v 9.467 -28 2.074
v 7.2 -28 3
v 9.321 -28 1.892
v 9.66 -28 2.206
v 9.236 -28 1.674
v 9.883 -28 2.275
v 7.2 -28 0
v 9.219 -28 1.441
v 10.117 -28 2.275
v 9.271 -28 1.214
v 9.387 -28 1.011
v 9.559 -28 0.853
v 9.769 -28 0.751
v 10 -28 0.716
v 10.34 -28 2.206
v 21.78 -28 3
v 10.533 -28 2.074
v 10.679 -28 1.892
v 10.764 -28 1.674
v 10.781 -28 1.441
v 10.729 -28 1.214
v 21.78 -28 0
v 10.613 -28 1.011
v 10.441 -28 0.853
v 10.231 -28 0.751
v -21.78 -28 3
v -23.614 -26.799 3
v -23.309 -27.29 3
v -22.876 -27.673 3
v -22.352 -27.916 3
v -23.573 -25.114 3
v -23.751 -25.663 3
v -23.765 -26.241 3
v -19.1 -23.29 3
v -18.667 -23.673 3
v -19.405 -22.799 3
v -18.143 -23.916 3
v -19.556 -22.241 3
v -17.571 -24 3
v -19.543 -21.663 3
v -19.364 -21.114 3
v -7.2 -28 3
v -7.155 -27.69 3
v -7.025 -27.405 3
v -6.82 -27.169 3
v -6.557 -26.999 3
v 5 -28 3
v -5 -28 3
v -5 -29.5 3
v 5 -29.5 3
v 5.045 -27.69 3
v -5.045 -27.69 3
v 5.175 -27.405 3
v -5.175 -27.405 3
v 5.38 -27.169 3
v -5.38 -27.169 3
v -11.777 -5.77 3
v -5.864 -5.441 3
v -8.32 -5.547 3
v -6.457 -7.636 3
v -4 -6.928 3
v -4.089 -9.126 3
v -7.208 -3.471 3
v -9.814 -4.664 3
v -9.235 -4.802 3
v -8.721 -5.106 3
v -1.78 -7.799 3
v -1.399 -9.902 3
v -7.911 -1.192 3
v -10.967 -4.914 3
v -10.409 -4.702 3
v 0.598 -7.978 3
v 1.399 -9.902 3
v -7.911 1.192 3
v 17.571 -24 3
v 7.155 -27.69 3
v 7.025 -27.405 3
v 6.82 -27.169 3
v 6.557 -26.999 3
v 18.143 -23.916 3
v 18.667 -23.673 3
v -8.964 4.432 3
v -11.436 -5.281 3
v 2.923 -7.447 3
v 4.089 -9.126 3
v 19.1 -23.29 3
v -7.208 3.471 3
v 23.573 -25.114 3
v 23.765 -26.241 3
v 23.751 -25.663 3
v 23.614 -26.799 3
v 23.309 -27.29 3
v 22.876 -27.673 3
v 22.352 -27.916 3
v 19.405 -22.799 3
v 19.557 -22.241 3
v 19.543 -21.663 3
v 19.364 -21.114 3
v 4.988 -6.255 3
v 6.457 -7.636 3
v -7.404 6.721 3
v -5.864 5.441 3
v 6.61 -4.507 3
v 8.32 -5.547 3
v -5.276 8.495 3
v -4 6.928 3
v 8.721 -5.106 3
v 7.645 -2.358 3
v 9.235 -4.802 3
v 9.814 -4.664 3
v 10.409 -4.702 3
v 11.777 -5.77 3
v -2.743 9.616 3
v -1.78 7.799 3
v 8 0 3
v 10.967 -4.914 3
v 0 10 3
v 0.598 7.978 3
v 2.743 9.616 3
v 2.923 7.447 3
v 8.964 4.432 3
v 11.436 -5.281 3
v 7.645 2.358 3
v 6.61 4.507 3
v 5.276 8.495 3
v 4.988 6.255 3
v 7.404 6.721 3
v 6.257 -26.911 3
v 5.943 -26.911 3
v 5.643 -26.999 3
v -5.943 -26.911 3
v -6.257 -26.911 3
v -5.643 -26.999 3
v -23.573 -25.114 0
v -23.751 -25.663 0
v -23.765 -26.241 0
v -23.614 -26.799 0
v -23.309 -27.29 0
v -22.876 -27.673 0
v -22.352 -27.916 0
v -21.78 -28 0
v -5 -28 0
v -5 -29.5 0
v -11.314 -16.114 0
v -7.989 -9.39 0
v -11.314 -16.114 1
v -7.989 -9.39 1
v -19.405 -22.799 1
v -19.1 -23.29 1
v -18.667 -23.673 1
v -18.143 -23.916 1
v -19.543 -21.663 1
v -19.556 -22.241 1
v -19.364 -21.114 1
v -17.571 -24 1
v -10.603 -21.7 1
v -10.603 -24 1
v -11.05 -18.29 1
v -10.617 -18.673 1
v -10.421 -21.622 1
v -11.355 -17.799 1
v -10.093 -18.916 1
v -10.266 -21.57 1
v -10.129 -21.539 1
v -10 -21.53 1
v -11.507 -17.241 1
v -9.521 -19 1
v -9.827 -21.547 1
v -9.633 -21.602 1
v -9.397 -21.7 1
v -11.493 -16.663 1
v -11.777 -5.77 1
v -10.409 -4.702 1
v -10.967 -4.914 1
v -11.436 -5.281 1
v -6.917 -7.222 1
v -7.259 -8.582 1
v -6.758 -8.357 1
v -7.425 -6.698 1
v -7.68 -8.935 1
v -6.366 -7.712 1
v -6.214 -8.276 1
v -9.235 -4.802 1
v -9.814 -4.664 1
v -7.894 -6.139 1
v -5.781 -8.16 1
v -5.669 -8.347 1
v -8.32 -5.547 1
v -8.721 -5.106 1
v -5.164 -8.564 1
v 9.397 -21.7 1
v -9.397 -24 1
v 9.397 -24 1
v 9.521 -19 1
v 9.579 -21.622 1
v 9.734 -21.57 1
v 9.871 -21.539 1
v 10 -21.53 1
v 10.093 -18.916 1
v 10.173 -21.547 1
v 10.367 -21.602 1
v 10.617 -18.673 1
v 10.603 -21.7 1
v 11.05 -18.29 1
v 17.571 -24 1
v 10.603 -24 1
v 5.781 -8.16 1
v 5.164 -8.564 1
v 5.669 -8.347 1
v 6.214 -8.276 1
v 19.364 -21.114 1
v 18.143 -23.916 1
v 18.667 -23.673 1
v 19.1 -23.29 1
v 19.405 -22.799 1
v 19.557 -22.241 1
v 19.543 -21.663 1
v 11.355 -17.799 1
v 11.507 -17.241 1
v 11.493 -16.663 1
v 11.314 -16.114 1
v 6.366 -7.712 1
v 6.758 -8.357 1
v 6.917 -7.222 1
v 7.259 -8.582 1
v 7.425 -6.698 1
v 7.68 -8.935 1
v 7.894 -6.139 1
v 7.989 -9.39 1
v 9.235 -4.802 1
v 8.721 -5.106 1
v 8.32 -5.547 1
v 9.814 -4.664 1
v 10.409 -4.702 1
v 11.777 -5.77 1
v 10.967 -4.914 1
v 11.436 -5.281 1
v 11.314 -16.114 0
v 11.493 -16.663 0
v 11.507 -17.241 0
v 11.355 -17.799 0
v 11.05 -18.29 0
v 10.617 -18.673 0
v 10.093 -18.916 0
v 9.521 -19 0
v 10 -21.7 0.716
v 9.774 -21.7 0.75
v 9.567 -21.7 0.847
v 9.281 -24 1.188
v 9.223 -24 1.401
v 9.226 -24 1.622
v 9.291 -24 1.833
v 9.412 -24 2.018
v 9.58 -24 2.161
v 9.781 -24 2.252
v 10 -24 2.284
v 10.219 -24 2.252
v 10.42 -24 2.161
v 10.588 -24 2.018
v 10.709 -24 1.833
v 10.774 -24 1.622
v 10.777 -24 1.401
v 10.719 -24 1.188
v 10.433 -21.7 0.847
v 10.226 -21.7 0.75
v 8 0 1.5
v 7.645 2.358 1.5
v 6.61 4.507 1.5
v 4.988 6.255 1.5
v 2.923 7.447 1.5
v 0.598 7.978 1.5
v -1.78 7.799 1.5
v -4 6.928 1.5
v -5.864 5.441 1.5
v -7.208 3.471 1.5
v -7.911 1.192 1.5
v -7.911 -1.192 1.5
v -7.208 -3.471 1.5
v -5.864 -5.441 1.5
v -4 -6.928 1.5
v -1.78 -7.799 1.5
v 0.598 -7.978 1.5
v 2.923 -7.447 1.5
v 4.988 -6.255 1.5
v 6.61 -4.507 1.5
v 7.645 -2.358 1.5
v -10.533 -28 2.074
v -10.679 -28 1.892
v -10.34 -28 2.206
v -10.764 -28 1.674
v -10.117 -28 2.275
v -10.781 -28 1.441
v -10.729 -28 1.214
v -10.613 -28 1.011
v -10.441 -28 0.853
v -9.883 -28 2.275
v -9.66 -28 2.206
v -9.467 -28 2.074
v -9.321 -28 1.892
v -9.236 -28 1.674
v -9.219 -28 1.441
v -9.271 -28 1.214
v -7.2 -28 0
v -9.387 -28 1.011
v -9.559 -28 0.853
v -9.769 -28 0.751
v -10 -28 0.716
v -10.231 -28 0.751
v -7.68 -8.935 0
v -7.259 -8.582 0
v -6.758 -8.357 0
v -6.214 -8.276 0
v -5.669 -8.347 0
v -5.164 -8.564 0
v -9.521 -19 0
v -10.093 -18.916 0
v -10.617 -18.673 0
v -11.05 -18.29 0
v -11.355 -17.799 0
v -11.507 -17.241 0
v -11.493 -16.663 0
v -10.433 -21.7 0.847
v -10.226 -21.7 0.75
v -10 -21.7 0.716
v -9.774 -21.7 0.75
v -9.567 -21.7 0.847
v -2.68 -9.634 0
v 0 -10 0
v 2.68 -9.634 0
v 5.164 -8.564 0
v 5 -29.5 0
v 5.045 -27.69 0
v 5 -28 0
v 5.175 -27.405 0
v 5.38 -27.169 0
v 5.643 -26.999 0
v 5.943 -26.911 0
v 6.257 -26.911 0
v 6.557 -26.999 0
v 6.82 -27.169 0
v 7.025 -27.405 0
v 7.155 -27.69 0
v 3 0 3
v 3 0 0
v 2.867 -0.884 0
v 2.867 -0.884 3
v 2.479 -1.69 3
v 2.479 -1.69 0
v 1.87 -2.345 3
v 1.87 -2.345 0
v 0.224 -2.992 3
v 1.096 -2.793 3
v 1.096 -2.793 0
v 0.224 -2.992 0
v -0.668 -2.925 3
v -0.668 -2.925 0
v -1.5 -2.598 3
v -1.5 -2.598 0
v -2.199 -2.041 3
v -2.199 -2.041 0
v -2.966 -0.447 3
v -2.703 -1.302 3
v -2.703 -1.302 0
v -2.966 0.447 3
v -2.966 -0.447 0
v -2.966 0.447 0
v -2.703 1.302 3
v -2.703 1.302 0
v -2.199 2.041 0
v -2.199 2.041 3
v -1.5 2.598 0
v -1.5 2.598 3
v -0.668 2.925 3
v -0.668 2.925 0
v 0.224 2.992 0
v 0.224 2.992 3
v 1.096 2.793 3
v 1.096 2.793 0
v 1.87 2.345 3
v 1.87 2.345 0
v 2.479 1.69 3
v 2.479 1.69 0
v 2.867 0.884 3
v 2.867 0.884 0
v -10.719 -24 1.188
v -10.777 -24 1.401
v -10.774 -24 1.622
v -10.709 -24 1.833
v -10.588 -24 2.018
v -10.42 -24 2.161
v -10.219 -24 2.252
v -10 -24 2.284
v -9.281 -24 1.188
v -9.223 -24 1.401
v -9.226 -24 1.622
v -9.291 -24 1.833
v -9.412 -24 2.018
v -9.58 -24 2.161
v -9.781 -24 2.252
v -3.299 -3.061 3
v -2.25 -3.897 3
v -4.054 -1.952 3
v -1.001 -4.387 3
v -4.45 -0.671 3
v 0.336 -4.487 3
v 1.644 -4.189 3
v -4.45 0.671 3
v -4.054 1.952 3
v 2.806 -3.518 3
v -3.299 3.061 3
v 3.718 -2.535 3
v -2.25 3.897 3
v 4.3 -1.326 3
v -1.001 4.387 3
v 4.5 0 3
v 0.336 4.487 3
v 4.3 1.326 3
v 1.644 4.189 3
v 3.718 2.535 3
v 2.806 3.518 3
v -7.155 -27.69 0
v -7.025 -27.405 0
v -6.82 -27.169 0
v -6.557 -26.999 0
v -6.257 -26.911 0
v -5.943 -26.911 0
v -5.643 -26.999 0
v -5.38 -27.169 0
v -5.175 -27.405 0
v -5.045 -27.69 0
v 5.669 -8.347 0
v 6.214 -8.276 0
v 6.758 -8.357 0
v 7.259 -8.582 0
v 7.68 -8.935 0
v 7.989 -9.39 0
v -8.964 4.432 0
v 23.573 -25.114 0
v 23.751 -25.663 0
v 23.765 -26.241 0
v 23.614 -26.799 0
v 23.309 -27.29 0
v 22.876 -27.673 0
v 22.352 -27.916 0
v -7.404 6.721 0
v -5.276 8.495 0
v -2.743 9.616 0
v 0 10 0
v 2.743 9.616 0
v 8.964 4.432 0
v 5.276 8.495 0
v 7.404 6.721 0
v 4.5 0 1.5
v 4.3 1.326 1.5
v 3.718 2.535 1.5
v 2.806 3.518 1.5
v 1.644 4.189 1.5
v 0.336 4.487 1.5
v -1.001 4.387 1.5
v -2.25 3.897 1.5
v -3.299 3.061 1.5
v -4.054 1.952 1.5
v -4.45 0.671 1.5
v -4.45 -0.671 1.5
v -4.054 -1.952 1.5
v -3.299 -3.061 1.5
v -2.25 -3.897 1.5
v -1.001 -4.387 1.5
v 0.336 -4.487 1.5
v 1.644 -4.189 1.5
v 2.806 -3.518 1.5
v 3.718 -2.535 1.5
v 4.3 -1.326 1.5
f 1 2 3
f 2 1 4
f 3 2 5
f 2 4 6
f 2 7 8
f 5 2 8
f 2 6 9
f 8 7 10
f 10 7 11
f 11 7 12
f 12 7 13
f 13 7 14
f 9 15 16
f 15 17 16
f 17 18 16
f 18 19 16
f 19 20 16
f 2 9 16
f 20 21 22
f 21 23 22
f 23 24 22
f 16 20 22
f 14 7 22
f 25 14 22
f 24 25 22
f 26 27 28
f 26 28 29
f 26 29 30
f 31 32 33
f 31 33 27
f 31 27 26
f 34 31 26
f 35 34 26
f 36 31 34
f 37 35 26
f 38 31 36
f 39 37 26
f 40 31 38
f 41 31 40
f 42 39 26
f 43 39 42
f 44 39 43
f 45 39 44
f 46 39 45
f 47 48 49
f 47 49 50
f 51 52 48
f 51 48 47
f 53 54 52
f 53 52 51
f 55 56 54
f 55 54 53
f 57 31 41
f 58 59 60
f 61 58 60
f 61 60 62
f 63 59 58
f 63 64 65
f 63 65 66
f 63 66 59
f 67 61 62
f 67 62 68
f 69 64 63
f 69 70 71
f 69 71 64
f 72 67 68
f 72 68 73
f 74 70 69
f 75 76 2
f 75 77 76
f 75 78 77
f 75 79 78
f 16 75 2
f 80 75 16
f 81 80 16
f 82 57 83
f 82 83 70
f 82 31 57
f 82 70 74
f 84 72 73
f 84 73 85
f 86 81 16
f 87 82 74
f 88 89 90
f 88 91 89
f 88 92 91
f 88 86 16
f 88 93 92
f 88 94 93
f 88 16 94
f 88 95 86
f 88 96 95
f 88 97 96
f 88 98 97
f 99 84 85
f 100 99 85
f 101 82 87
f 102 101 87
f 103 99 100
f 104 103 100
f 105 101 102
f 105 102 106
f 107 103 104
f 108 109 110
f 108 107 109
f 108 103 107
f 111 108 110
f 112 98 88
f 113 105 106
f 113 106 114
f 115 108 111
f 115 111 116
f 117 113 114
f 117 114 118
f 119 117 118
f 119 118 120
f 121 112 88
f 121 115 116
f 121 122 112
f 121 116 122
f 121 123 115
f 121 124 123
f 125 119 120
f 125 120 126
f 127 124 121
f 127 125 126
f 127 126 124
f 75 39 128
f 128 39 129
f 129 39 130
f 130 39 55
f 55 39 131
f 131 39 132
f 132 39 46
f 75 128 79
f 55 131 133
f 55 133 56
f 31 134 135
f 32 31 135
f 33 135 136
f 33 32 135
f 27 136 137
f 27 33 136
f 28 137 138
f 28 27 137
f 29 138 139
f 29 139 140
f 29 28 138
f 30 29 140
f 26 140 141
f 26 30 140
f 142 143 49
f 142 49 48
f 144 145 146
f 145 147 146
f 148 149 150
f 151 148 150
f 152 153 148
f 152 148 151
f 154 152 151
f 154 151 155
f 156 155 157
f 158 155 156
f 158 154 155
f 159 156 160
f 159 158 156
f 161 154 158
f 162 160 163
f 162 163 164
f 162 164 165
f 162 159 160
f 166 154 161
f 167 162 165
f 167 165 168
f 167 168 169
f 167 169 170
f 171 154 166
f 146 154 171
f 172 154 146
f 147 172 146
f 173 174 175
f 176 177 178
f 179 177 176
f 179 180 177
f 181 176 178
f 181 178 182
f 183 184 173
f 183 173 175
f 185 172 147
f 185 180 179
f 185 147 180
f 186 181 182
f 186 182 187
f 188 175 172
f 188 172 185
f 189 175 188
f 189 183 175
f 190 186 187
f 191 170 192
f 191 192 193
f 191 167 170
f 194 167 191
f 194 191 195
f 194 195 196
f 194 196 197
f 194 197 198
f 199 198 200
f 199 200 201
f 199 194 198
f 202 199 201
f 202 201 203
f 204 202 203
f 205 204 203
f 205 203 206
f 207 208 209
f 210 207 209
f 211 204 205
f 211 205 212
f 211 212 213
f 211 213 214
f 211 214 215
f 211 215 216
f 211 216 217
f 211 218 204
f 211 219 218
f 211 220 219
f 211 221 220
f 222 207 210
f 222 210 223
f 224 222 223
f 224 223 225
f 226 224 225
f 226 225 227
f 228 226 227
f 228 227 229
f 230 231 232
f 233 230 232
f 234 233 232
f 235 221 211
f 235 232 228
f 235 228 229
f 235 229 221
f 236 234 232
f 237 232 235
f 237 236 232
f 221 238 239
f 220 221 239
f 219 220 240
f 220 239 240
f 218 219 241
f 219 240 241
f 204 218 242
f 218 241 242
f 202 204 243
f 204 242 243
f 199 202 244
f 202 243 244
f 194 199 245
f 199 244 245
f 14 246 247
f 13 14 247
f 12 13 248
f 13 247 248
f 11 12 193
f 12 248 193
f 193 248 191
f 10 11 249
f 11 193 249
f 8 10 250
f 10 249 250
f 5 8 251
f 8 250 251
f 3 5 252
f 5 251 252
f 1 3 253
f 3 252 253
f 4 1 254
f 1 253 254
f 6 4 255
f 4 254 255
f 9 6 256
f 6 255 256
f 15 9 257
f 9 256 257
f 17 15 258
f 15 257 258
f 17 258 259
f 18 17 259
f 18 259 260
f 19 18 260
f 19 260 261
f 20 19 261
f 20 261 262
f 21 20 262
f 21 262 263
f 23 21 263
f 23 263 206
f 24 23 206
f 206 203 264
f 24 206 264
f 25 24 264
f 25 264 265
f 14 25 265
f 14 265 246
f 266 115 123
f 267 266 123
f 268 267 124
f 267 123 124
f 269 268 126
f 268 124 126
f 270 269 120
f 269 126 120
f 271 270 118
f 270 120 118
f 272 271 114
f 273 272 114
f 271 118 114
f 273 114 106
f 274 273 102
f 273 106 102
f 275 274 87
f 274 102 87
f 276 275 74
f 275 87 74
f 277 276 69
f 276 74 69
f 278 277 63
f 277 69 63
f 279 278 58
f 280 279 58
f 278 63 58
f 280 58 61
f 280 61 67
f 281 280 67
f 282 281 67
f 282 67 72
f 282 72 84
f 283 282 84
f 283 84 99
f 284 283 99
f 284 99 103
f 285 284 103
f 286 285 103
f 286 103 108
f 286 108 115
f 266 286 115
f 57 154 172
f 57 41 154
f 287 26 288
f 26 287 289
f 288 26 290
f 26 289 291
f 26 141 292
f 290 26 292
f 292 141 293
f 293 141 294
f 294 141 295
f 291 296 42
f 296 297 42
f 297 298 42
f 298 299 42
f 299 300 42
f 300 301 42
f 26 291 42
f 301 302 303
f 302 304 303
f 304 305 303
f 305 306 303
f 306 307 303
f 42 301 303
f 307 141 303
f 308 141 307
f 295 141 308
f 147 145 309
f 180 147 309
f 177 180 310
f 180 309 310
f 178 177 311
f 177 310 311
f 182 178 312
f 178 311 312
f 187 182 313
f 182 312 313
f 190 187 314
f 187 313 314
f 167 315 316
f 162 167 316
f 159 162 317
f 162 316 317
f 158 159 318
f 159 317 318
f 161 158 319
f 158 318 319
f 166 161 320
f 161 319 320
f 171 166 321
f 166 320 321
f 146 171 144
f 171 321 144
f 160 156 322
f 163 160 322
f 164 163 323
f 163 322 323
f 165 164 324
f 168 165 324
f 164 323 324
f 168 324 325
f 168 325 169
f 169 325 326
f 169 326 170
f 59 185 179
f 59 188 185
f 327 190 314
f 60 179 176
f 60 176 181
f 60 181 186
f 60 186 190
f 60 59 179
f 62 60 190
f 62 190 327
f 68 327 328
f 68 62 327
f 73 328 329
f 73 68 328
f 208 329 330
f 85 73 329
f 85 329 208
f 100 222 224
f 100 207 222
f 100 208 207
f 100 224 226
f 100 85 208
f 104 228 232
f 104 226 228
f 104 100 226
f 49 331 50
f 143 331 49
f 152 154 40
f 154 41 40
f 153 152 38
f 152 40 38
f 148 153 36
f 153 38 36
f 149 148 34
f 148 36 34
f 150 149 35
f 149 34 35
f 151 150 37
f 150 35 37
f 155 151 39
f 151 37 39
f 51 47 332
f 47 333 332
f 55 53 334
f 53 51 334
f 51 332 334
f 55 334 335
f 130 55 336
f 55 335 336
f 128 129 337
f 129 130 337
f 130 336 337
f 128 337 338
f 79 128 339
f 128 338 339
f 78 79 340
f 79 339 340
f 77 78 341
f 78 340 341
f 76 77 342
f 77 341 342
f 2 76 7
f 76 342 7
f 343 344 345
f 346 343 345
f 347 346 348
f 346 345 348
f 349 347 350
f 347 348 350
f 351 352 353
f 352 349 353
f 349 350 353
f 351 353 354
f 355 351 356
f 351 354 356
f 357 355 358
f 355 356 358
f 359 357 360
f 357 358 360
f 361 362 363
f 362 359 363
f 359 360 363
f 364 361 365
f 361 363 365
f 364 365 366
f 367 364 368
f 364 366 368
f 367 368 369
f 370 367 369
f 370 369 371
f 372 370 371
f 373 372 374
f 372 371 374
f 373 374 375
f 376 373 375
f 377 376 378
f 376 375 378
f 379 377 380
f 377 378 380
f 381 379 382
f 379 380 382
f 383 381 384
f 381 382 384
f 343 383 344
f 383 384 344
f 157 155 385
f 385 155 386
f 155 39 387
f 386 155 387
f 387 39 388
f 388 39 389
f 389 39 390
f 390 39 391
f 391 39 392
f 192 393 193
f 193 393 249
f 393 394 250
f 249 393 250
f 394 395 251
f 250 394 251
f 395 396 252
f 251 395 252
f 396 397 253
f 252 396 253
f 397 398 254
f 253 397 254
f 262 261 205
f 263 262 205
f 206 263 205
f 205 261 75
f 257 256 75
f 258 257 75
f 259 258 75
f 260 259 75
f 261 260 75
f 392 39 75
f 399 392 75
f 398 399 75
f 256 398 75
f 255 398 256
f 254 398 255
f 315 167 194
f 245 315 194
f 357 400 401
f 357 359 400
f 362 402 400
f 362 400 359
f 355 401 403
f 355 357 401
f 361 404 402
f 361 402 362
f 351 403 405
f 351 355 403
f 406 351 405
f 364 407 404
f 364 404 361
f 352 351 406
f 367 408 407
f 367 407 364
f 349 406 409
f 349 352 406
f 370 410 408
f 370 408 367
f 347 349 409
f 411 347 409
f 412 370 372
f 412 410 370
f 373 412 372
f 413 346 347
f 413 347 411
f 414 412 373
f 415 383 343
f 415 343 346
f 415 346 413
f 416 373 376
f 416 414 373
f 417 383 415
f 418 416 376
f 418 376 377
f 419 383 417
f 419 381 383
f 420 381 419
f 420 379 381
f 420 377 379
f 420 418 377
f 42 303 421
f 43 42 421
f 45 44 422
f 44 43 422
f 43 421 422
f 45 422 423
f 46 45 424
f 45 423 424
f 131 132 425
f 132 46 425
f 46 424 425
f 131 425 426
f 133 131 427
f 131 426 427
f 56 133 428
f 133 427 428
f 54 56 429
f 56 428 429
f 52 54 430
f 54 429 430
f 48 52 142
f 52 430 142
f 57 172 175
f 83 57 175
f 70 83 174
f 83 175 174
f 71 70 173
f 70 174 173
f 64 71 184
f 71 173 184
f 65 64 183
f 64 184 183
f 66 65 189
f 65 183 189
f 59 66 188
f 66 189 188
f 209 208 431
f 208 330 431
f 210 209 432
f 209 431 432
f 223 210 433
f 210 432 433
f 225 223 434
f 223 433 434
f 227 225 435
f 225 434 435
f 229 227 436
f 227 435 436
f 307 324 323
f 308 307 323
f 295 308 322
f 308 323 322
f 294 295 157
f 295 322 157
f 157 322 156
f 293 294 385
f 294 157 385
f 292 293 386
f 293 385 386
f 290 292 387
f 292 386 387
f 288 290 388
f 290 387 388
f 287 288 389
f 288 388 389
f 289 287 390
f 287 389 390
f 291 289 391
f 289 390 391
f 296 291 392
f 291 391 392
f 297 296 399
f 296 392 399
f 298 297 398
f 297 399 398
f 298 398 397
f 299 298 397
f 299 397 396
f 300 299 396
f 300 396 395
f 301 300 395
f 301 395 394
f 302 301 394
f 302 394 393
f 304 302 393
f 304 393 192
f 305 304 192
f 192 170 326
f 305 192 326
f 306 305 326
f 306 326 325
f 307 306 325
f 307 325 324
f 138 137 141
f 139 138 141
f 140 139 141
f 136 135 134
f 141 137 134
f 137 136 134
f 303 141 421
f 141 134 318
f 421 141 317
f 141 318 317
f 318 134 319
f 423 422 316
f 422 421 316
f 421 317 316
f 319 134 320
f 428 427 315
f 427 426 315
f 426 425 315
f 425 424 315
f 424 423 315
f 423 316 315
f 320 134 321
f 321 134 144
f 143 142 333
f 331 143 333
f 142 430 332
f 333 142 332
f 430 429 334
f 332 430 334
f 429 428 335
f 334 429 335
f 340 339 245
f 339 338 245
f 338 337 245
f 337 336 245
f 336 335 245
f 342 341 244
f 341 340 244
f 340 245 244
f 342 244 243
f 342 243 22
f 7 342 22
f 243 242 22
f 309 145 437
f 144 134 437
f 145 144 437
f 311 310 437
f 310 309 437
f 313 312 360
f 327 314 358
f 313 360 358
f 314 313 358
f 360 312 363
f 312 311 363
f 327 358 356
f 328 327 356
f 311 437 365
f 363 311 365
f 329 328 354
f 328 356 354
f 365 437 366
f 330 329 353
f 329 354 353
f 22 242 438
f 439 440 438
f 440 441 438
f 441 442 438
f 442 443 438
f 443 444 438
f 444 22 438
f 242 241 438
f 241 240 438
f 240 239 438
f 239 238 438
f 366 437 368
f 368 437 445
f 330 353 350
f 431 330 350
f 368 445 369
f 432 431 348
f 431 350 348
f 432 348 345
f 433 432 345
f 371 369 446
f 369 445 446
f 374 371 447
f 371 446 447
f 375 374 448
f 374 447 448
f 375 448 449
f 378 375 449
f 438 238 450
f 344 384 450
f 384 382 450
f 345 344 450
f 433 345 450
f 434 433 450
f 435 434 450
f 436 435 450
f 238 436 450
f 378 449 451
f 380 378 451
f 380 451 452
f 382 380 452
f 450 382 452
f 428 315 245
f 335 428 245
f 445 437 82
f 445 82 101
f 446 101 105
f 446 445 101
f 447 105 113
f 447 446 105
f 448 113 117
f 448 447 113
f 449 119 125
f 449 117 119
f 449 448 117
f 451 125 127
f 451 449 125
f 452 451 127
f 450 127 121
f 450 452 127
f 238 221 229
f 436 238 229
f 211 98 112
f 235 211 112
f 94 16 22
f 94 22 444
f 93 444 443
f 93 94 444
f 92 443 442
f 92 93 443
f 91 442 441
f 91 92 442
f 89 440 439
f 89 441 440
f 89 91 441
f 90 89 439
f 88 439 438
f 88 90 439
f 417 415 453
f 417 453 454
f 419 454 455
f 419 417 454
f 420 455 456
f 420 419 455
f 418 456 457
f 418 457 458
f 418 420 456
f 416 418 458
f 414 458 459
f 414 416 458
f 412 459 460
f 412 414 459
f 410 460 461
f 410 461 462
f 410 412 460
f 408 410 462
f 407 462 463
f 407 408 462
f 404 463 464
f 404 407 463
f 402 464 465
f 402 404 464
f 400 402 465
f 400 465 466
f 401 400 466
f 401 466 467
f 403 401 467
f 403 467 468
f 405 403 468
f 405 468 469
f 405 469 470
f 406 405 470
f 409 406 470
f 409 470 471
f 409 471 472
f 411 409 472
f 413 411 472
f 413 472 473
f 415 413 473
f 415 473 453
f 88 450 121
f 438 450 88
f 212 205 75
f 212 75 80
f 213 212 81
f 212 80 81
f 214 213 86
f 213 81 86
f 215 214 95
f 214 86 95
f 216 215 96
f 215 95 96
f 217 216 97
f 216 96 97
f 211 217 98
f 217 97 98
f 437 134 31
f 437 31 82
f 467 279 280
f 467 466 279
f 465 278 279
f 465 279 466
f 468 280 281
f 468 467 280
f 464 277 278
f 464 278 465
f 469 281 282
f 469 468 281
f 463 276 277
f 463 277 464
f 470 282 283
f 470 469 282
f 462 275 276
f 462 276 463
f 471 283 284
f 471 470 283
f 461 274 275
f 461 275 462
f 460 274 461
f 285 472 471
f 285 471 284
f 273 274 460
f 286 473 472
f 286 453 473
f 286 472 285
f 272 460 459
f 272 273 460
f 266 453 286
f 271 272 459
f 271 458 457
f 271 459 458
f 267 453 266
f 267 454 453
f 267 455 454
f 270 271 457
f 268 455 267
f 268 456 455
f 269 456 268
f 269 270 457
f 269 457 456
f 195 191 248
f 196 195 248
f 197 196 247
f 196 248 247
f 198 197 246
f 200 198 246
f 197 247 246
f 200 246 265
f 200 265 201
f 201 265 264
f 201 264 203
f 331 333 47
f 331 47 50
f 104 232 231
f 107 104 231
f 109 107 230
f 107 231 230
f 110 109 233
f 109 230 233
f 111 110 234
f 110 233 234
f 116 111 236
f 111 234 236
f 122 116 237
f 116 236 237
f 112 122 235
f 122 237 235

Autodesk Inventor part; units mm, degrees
ref_plane "YZ Plane" through (0, 0, 0) normal (1, 0, 0) x (0, 1, 0)
ref_plane "XZ Plane" through (0, 0, 0) normal (0, 1, 0) x (-1, 0, 0)
ref_plane "XY Plane" through (0, 0, 0) normal (0, 0, 1) x (1, 0, 0)
sketch "スケッチ1" plane through (0, 0, 0) normal (0, 0, 1) x (1, 0, 0)
  circle A0 centre (0, 0) radius 3
  circle A1 centre (0, 0) radius 10
  line L0 (-25, -28) -> (25, -28)
  line L1 (-5, -28) -> (5, -28)
  line L2 (5, -28) -> (5, -29.5)
  line L3 (5, -29.5) -> (-5, -29.5)
  line L4 (-5, -29.5) -> (-5, -28)
  circle A2 centre (-6.1, -28) radius 1.1
  circle A3 centre (6.1, -28) radius 1.1
  line L5 (-25, -28) -> (-8.9641, 4.4322)
  line L6 (8.9641, 4.4322) -> (25, -28)
  line L7 (0, 0) -> (0, -28) construction
  point P0 (0, -29.5)
  point P1 (-7.2, -28)
  point P2 (7.2, -28)
  dimension "d5" = 2.2
  dimension "d6" = 2.2
  dimension "d0" = 6
  dimension "d1" = 20
  dimension "d2" = 28
  dimension "d3" = 1.5
  dimension "d4" = 10
  dimension "d7" = 50
extrude "押し出し1" add sketch "スケッチ1" along normal blind 3 contours A1 | A1 L6 L0 A3 A2 L5 | L2 L3 L4 L0
fillet "フィレット1" radius 2 2 edges at (25, -28, 1.5) (-25, -28, 1.5)
sketch "スケッチ2" plane through (-7.2, -28, 0) normal (0, -1, 0) x (1, 0, 0)
  line L0 (2.2, 0) -> (2.2, 3) projected
  line L1 (12.2, 0) -> (12.2, 3) projected
  point P0 (7.2, 0)
  point P1 (-2.8, 1.5)
  point P2 (17.2, 1.5)
  point P3 (2.2, 1.5)
  point P4 (12.2, 1.5)
  dimension "d11" = 5
  dimension "d12" = 5
hole "穴1" at (-10, -28, 1.5) at (10, -28, 1.5) direction (0, 1, 0) diameter 1.567 depth 6.3 tip angle 118 thread size "M2x0.4" class "6H" standard "ISO Metric profile"
sketch "スケッチ3" plane through (0, 0, 3) normal (0, 0, 1) x (1, 0, 0)
  arc A0 (-23.5728, -25.1136) -> (-21.78, -28) centre (-21.78, -26) ccw projected
  line L0 (-21.78, -28) -> (-7.2, -28) projected
  arc A1 (-5, -28) -> (-7.2, -28) centre (-6.1, -28) ccw projected
  line L1 (-5, -28) -> (-5, -29.5) projected
  line L2 (-5, -29.5) -> (5, -29.5) projected
  line L3 (5, -29.5) -> (5, -28) projected
  arc A2 (7.2, -28) -> (5, -28) centre (6.1, -28) ccw projected
  line L4 (7.2, -28) -> (21.78, -28) projected
  arc A3 (21.78, -28) -> (23.5728, -25.1136) centre (21.78, -26) ccw projected
  line L5 (23.5728, -25.1136) -> (8.9641, 4.4322) projected
  arc A4 (8.9641, 4.4322) -> (-8.9641, 4.4322) centre (0, 0) ccw projected
  line L6 (-8.9641, 4.4322) -> (-23.5728, -25.1136) projected
  circle A5 centre (0, 0) radius 3 projected
  line L7 (-17.5711, -24) -> (17.5711, -24)
  line L8 (19.3639, -21.1136) -> (9.8306, -1.8327)
  line L9 (-19.3639, -21.1136) -> (-9.8306, -1.8327)
  circle A6 centre (0, 0) radius 10
  line L10 (23.5728, -25.1136) -> (8.9641, 4.4322) projected
  arc A7 (-19.3639, -21.1136) -> (-17.5711, -24) centre (-17.5711, -22) ccw
  arc A8 (17.5711, -24) -> (19.3639, -21.1136) centre (17.5711, -22) ccw
  line L11 (-5.3486, -4.0488) -> (-12.7411, -19)
  line L12 (-12.7411, -19) -> (12.7411, -19)
  line L13 (12.7411, -19) -> (5.3486, -4.0488)
  point P0 (6.9173, -7.2215)
  point P1 (-6.9173, -7.2215)
  dimension "d20" = 2
  dimension "d21" = 2
  dimension "d22" = 4
  dimension "d23" = 2
  dimension "d27" = 20
  dimension "d33" = 5
extrude "押し出し2" cut sketch "スケッチ3" against normal blind 2 contours A6 L11 L12 L13 L8 A8 L7 A7 L9 | A6 L13 L12 L11
fillet "フィレット2" radius 2 2 edges at (-9.8306, -1.8327, 2) (9.8306, -1.8327, 2)
sketch "スケッチ4" plane through (0, 0, 3) normal (0, 0, 1) x (1, 0, 0)
  circle A0 centre (0, 0) radius 10
  arc A1 (-8.3205, -5.547) -> (8.3205, -5.547) centre (0, 0) ccw projected
  circle A2 centre (0, 0) radius 8
  circle A3 centre (0, 0) radius 3 projected
  circle A4 centre (0, 0) radius 4.5
  dimension "d28" = 2
  dimension "d30" = 1.5
extrude "押し出し3" cut sketch "スケッチ4" against normal blind 1.5 contours A2
extrude "押し出し4" cut sketch "スケッチ3" against normal through all contours A6 L13 L12 L11
fillet "フィレット3" radius 2 4 edges at (-6.9173, -7.2215, 0.5) (6.9173, -7.2215, 0.5) (-12.7411, -19, 0.5) (12.7411, -19, 0.5)
equation "\"d12\" = d11"
properties part number "kosipitch"
